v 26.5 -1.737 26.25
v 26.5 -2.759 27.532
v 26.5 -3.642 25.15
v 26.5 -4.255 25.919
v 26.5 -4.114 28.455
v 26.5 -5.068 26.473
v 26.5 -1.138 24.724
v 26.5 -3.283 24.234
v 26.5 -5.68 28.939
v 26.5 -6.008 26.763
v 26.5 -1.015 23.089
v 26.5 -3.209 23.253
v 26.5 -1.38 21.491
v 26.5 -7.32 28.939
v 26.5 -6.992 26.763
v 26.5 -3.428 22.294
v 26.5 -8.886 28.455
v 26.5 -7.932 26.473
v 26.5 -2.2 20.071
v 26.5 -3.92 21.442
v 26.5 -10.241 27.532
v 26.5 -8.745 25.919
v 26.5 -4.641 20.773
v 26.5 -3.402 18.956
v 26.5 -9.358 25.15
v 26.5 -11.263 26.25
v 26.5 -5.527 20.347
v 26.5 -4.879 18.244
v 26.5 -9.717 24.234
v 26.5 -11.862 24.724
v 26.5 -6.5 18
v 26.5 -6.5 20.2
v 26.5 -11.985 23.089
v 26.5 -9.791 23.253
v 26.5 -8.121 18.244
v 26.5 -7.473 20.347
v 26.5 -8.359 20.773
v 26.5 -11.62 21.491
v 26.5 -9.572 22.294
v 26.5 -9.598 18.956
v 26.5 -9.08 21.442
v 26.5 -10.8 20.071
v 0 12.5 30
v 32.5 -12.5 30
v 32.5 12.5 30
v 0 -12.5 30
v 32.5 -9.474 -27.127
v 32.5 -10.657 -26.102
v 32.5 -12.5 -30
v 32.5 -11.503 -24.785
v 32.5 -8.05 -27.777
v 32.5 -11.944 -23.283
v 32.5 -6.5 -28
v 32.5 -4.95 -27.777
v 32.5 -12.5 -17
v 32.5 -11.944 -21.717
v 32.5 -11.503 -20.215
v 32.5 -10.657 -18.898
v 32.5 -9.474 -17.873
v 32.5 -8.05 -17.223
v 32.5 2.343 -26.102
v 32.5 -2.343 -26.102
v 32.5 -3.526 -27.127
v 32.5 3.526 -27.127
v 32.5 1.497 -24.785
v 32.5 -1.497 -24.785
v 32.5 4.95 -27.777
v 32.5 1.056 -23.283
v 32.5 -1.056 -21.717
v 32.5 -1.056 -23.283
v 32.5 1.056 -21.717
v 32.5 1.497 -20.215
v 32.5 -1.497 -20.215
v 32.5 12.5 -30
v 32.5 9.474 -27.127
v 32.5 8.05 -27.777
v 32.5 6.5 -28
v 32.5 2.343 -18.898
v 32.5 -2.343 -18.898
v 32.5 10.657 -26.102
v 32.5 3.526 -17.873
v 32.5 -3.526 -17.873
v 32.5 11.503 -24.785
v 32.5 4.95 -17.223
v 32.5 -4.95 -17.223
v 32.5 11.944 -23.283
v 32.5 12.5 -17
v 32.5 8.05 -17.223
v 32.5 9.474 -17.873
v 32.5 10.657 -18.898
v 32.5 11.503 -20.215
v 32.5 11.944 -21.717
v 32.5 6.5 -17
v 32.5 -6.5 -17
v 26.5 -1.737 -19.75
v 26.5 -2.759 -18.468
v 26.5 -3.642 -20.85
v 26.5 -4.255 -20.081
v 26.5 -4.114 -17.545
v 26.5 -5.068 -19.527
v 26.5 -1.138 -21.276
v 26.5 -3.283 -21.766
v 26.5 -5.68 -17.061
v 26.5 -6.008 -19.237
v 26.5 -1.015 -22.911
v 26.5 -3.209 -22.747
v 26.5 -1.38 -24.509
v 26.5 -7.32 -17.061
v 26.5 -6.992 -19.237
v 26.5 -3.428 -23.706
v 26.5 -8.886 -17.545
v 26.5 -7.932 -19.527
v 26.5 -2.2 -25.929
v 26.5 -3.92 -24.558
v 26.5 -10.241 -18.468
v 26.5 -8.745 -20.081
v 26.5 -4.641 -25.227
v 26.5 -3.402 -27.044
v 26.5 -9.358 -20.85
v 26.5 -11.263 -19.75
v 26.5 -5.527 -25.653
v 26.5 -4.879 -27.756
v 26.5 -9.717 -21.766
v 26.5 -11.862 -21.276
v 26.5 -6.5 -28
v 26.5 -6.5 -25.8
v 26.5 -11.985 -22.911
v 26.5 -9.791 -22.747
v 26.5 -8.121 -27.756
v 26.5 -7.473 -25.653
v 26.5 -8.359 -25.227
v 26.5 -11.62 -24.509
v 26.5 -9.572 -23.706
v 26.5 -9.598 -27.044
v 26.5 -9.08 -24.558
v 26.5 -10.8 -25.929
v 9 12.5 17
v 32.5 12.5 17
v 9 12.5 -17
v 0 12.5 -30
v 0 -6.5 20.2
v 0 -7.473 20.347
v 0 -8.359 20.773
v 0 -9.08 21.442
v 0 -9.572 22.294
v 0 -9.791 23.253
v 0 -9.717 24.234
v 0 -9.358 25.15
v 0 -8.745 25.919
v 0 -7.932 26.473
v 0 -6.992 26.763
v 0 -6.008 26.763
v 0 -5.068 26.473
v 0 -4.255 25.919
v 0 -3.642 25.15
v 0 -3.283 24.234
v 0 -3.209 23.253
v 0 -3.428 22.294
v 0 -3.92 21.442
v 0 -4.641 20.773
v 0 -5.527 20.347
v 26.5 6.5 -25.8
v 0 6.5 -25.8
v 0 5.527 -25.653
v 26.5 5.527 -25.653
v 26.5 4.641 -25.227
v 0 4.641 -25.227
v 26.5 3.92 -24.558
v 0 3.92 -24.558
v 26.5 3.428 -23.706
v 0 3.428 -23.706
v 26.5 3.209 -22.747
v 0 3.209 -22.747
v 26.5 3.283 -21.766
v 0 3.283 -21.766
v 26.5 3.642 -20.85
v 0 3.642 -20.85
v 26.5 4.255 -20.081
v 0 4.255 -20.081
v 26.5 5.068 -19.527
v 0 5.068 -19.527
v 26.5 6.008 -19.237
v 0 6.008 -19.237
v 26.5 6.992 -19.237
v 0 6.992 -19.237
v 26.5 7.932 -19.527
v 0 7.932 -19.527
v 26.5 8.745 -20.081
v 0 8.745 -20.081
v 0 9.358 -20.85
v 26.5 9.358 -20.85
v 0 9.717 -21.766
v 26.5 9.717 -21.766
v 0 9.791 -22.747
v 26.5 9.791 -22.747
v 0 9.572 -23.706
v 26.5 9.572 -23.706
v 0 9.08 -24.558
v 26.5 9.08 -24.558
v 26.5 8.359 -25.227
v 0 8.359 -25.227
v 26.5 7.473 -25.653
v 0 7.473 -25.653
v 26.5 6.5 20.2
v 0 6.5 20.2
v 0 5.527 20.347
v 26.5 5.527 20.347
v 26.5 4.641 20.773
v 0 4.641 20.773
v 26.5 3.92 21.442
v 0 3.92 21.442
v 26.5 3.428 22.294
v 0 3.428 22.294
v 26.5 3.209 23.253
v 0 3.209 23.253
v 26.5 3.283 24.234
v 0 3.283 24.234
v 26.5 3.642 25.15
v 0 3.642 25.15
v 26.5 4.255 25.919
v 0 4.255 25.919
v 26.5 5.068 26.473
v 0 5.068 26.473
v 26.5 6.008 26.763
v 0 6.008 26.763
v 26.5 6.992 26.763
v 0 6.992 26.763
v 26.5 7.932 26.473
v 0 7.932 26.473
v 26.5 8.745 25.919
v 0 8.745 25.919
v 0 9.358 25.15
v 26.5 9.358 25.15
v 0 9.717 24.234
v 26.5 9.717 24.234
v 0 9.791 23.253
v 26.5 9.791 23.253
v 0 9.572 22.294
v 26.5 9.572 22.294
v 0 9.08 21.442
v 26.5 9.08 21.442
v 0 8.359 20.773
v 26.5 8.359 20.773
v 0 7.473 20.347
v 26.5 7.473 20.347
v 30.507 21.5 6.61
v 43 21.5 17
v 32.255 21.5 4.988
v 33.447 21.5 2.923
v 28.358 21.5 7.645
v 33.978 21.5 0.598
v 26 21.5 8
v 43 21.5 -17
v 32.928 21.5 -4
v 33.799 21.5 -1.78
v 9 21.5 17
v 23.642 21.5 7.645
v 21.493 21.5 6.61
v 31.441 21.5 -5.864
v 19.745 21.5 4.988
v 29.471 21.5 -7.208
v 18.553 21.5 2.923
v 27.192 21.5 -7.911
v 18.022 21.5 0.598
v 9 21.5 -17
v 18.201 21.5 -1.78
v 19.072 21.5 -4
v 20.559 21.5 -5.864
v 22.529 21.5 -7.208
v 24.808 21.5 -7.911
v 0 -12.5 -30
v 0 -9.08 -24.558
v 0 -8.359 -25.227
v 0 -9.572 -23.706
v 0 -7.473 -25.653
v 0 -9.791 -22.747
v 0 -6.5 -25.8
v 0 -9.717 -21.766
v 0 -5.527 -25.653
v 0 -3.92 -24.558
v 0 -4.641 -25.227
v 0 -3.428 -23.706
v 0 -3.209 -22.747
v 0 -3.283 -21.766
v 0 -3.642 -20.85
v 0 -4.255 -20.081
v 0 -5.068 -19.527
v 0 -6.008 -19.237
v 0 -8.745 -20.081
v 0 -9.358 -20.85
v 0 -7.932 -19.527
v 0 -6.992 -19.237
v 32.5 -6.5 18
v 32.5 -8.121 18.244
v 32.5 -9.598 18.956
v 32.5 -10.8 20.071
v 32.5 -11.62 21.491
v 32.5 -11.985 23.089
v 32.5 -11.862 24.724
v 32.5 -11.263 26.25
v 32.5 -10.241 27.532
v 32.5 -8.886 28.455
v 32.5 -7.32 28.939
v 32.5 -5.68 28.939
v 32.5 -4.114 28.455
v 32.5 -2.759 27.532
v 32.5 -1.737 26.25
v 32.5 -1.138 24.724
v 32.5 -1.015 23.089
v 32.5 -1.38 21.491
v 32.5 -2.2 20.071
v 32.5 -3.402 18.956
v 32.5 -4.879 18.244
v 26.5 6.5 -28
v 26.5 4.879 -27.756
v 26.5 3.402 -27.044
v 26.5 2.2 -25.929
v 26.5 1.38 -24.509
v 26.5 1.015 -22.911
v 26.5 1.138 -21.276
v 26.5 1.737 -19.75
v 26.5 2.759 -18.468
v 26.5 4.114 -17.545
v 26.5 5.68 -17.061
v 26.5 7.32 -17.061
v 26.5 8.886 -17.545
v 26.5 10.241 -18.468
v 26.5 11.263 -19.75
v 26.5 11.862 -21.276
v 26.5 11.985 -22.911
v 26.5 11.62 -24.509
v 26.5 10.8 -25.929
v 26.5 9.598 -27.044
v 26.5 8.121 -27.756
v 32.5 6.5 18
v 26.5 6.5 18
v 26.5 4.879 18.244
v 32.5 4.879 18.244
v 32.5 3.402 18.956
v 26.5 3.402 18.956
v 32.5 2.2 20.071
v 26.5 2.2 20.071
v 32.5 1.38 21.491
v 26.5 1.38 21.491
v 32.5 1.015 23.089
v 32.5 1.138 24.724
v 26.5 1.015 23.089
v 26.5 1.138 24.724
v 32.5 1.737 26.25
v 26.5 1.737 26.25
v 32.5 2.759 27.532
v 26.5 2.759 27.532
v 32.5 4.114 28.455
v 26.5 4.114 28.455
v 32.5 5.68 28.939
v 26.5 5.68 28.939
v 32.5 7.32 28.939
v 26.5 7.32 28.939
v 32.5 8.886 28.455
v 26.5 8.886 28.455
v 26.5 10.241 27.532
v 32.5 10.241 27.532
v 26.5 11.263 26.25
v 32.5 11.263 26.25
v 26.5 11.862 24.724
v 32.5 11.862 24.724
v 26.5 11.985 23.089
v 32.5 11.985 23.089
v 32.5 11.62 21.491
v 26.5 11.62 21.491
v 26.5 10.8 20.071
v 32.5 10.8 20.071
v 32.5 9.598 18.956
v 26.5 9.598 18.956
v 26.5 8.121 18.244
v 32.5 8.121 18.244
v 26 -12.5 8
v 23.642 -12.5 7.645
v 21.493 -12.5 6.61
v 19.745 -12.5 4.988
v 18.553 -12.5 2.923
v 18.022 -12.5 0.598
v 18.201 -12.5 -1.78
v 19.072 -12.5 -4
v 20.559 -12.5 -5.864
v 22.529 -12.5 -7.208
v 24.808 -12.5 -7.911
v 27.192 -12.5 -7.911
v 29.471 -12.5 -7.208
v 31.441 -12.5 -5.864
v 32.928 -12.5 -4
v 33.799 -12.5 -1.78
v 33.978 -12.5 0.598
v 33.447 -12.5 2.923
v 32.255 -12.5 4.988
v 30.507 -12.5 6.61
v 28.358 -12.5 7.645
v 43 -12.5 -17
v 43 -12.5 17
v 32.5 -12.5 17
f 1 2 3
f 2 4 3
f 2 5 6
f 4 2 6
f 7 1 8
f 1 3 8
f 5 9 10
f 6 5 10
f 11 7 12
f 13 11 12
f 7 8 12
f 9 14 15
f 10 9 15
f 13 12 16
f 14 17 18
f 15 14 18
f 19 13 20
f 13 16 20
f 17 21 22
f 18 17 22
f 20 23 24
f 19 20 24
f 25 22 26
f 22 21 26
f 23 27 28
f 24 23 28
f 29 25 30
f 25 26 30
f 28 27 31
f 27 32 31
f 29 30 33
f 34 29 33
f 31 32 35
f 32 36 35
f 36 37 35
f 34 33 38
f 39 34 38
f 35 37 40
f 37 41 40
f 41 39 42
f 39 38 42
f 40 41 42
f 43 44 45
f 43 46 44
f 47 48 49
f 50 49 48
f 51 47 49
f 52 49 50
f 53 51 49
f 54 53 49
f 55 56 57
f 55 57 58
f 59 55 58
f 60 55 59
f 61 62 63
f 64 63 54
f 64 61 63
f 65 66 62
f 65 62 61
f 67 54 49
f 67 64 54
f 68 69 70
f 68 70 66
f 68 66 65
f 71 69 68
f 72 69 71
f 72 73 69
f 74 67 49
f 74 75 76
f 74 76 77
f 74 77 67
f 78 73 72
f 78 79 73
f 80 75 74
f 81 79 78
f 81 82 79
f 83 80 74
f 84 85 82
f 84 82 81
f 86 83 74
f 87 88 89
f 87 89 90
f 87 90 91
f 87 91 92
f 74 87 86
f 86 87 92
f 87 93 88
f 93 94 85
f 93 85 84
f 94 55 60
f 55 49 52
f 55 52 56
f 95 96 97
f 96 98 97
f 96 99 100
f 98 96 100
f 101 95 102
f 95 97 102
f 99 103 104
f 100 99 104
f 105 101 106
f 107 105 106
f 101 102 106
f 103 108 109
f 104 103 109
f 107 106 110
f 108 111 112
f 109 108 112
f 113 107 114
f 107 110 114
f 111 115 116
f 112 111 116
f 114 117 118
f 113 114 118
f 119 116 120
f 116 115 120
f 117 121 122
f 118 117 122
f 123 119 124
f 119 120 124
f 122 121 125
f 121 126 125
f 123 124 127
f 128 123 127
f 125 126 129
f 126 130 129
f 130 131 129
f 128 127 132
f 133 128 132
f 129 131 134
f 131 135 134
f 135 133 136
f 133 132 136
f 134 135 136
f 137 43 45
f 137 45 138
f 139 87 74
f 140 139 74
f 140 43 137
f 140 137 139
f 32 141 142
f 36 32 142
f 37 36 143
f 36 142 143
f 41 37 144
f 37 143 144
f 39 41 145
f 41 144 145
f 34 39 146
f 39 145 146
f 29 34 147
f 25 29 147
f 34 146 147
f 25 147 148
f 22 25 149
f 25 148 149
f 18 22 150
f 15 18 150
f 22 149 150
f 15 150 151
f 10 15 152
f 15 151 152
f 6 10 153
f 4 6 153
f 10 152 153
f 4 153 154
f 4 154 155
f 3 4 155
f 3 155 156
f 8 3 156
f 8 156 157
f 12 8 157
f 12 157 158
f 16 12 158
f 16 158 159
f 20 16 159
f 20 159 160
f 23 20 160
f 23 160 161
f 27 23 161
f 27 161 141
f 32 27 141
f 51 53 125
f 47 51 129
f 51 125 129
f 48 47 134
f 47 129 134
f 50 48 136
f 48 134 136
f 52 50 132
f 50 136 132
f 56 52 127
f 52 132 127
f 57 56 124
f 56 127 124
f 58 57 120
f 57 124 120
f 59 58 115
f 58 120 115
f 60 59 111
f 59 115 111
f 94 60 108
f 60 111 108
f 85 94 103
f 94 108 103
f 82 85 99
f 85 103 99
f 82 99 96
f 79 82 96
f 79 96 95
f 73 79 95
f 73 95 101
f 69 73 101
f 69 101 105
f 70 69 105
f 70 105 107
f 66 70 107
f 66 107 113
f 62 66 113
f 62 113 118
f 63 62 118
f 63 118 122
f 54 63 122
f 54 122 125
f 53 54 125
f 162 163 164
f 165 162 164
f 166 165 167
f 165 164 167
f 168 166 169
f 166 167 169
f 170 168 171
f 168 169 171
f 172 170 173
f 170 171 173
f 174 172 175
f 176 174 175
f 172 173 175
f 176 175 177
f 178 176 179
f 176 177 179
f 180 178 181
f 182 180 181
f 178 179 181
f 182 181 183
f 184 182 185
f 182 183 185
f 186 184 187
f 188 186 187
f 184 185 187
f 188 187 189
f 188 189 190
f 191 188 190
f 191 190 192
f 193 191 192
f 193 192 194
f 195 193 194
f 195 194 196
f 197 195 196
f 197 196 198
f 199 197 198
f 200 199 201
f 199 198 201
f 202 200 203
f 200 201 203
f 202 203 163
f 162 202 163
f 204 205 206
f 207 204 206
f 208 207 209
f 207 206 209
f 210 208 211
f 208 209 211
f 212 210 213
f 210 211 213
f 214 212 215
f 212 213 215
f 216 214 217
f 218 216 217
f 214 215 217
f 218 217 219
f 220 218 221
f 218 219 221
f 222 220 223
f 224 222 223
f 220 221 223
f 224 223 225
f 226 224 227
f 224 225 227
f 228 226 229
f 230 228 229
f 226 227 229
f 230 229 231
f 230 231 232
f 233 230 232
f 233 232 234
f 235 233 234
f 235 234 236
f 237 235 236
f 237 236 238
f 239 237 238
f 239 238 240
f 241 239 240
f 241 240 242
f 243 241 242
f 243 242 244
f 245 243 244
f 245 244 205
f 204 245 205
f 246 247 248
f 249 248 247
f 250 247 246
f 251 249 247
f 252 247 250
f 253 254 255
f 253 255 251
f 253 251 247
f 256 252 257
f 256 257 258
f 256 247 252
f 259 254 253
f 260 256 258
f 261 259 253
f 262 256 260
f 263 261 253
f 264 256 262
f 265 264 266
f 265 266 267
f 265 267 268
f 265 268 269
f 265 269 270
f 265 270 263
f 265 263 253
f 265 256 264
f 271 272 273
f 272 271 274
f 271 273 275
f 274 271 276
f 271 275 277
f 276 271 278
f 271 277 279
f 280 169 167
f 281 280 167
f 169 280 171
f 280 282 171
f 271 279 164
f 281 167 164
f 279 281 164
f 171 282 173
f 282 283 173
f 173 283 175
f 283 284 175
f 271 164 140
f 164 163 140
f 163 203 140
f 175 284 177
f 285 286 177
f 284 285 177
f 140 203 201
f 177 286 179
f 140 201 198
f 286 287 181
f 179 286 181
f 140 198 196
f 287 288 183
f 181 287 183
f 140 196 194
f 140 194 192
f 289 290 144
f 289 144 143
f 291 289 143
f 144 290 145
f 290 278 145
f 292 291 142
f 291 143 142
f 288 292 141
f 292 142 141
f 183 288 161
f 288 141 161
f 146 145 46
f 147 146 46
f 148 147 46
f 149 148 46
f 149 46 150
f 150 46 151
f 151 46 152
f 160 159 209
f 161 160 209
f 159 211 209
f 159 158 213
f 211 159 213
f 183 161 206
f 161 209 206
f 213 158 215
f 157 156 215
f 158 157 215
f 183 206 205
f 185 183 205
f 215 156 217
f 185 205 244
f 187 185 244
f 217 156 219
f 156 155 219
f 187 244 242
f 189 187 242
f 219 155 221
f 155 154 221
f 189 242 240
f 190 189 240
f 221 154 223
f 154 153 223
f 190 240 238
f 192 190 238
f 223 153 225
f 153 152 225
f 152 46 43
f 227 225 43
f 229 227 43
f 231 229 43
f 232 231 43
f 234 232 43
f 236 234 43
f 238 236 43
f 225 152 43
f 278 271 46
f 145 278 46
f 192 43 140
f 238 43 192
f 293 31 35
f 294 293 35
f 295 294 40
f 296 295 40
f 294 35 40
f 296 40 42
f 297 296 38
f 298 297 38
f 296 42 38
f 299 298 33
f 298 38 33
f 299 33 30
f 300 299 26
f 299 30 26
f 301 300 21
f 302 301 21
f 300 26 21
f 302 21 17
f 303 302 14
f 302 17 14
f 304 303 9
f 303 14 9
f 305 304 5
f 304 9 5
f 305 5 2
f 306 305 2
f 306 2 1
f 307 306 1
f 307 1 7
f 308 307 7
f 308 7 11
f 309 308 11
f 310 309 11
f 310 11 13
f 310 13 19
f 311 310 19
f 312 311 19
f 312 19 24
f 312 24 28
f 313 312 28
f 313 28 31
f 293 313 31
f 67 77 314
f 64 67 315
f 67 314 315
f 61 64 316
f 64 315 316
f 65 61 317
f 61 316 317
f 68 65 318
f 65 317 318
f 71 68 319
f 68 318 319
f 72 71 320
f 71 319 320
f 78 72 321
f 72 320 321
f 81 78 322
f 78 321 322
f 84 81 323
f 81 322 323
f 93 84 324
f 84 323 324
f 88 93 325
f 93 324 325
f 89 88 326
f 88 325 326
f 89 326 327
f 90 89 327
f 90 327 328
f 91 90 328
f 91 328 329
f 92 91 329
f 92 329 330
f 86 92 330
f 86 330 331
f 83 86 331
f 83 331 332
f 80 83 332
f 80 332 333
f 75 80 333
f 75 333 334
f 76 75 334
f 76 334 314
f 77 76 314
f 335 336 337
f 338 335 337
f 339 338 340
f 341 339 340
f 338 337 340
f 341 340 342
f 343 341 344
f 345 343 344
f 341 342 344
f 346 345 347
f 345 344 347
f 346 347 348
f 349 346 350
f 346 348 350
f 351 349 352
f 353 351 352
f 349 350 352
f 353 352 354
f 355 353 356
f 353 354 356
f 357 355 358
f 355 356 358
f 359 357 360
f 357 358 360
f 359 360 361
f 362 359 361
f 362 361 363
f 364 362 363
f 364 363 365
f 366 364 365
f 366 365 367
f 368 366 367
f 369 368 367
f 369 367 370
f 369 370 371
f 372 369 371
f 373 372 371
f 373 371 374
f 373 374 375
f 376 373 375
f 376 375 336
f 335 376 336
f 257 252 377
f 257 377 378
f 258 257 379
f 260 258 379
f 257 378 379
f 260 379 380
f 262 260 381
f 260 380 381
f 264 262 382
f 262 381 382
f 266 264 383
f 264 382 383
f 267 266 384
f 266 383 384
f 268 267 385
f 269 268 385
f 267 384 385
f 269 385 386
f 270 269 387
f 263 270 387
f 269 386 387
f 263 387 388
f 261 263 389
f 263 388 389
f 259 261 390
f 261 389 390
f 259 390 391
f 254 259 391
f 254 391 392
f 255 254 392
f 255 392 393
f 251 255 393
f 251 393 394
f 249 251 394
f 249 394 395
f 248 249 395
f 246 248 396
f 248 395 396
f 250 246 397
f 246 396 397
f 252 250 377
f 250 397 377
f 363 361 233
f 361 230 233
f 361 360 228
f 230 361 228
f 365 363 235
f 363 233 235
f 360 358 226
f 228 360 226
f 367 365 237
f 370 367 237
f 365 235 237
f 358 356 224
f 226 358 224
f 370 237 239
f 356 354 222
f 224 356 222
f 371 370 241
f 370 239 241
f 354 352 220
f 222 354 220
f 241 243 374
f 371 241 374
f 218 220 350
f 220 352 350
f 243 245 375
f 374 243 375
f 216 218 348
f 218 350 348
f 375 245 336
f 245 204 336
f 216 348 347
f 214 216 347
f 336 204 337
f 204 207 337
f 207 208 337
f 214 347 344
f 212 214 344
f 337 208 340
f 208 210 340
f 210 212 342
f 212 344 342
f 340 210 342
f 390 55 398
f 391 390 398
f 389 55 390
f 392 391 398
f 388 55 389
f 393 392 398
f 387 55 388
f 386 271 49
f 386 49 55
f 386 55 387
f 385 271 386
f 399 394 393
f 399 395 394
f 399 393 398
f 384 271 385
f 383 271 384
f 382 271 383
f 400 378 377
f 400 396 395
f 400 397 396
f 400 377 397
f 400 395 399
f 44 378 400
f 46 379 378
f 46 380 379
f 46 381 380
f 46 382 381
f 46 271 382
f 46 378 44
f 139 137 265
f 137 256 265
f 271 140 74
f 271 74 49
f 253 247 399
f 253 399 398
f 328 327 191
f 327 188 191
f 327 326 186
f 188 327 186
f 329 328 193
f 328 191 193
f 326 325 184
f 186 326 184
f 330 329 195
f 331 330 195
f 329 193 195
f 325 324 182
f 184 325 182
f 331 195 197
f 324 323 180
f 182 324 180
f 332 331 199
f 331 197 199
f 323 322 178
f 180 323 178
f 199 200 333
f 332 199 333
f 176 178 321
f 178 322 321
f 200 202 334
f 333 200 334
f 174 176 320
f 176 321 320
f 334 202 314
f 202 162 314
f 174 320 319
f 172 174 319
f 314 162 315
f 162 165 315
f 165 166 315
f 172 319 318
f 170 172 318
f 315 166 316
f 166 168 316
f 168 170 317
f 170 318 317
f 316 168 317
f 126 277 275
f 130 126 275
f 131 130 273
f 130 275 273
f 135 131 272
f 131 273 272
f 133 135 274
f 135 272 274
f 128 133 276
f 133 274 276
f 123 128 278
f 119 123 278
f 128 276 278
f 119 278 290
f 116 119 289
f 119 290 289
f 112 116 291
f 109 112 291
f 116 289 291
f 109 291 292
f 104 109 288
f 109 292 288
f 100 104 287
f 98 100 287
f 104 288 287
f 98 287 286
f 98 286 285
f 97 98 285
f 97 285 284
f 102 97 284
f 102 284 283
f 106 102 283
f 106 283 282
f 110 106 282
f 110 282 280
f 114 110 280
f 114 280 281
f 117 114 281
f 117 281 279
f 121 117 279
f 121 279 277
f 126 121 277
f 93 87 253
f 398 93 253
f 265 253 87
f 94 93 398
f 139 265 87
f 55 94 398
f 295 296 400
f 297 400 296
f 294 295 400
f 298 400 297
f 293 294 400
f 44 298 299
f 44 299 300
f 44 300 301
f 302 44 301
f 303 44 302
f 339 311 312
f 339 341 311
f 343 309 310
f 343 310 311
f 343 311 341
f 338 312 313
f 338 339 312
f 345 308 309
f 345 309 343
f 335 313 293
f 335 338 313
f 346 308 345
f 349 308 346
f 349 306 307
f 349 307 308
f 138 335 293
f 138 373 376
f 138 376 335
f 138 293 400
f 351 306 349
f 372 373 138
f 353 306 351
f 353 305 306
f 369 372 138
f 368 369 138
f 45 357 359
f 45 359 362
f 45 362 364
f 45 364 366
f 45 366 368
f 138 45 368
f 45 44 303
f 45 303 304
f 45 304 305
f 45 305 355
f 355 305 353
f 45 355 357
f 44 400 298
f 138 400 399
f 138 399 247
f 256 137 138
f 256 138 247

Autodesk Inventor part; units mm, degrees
ref_plane "YZ Plane" through (0, 0, 0) normal (1, 0, 0) x (0, 1, 0)
ref_plane "XZ Plane" through (0, 0, 0) normal (0, 1, 0) x (-1, 0, 0)
ref_plane "XY Plane" through (0, 0, 0) normal (0, 0, 1) x (1, 0, 0)
sketch "Skizze1" plane through (0, 0, 0) normal (1, 0, 0) x (0, 1, 0)
  line L0 (-12.5, 30) -> (12.5, 30)
  line L1 (12.5, 30) -> (12.5, -30)
  line L2 (12.5, -30) -> (-12.5, -30)
  line L3 (-12.5, -30) -> (-12.5, 30)
  line L4 (-12.5, 30) -> (12.5, -30) construction
  line L5 (12.5, 30) -> (-12.5, -30) construction
  point P0 (0, 0)
  dimension "d0" = 25
  dimension "d1" = 60
extrude "Extrusion1" add sketch "Skizze1" along normal blind 32.5
sketch "Skizze2" plane through (32.5, 0, 0) normal (1, 0, 0) x (0, 0, -1)
  line L0 (-30, -12.5) -> (30, -12.5) construction
  line L1 (0, -12.5) -> (17, -12.5) construction
  line L2 (17, -12.5) -> (-17, -12.5)
  line L3 (-17, -12.5) -> (-17, 21.5)
  line L4 (-17, 21.5) -> (17, 21.5)
  line L5 (17, 21.5) -> (17, -12.5)
  point P0 (0, 0)
  dimension "d4" = 17
  dimension "d5" = 34
  dimension "d6" = 34
extrude "Extrusion2" add sketch "Skizze2" along normal blind 10.5
extrude "Extrusion3" add sketch "Skizze2" against normal blind 23.5
sketch "Skizze3" plane through (43, 21.5, 17) normal (0, 1, 0) x (1, 0, 0)
  line L0 (-34, 0) -> (-34, 34) construction
  line L1 (-10.5, 34) -> (0, 34) construction
  line L2 (-34, 0) -> (0, 34) construction
  line L3 (0, 34) -> (0, 0) construction
  line L4 (-34, 34) -> (0, 0) construction
  point P0 (-43, 17)
sketch "Skizze4" plane through (43, 21.5, 17) normal (0, 1, 0) x (1, 0, 0)
  point P0 (-43, 17)
  point P1 (-17, 17)
hole "Bohrung1" at (26, 21.5, 0) direction (0, -1, 0) diameter 16 end through all
sketch "Skizze5" plane through (32.5, 0, 0) normal (1, 0, 0) x (0, 0, -1)
  line L0 (-17, 21.5) -> (-17, -12.5) construction
  line L1 (-17, 12.5) -> (-30, 12.5) construction
  line L2 (-30, 12.5) -> (-30, -12.5) construction
  line L3 (-30, -12.5) -> (-17, -12.5) construction
  line L4 (-30, 12.5) -> (30, 12.5) construction
  line L5 (-23.5, 12.5) -> (-23.5, -12.5) construction
  line L6 (30, -12.5) -> (-30, -12.5) construction
  line L7 (-23.5, 12.5) -> (-23.5, 6.5) construction
  line L8 (-23.5, 6.5) -> (-23.5, -6.5) construction
  line L9 (-23.5, 6.5) -> (22.5, 6.5) construction
  line L10 (22.5, 6.5) -> (22.5, -6.5) construction
  point P0 (0, 0)
  dimension "d18" = 6
  dimension "d19" = 13
  dimension "d20" = 46
  dimension "d21" = 13
hole "Bohrung2" at (32.5, 6.5, 23.5) at (32.5, -6.5, 23.5) at (32.5, 6.5, -22.5) at (32.5, -6.5, -22.5) direction (-1, 0, 0) diameter 6.6 end through all counterbore diameter 11 counterbore depth 6 clearance for "Innensechskantkopfschraube" size "M6" standard "ANSI Metrisches M Profil"
properties part number "Festlager" material "Eisen, Grau"
